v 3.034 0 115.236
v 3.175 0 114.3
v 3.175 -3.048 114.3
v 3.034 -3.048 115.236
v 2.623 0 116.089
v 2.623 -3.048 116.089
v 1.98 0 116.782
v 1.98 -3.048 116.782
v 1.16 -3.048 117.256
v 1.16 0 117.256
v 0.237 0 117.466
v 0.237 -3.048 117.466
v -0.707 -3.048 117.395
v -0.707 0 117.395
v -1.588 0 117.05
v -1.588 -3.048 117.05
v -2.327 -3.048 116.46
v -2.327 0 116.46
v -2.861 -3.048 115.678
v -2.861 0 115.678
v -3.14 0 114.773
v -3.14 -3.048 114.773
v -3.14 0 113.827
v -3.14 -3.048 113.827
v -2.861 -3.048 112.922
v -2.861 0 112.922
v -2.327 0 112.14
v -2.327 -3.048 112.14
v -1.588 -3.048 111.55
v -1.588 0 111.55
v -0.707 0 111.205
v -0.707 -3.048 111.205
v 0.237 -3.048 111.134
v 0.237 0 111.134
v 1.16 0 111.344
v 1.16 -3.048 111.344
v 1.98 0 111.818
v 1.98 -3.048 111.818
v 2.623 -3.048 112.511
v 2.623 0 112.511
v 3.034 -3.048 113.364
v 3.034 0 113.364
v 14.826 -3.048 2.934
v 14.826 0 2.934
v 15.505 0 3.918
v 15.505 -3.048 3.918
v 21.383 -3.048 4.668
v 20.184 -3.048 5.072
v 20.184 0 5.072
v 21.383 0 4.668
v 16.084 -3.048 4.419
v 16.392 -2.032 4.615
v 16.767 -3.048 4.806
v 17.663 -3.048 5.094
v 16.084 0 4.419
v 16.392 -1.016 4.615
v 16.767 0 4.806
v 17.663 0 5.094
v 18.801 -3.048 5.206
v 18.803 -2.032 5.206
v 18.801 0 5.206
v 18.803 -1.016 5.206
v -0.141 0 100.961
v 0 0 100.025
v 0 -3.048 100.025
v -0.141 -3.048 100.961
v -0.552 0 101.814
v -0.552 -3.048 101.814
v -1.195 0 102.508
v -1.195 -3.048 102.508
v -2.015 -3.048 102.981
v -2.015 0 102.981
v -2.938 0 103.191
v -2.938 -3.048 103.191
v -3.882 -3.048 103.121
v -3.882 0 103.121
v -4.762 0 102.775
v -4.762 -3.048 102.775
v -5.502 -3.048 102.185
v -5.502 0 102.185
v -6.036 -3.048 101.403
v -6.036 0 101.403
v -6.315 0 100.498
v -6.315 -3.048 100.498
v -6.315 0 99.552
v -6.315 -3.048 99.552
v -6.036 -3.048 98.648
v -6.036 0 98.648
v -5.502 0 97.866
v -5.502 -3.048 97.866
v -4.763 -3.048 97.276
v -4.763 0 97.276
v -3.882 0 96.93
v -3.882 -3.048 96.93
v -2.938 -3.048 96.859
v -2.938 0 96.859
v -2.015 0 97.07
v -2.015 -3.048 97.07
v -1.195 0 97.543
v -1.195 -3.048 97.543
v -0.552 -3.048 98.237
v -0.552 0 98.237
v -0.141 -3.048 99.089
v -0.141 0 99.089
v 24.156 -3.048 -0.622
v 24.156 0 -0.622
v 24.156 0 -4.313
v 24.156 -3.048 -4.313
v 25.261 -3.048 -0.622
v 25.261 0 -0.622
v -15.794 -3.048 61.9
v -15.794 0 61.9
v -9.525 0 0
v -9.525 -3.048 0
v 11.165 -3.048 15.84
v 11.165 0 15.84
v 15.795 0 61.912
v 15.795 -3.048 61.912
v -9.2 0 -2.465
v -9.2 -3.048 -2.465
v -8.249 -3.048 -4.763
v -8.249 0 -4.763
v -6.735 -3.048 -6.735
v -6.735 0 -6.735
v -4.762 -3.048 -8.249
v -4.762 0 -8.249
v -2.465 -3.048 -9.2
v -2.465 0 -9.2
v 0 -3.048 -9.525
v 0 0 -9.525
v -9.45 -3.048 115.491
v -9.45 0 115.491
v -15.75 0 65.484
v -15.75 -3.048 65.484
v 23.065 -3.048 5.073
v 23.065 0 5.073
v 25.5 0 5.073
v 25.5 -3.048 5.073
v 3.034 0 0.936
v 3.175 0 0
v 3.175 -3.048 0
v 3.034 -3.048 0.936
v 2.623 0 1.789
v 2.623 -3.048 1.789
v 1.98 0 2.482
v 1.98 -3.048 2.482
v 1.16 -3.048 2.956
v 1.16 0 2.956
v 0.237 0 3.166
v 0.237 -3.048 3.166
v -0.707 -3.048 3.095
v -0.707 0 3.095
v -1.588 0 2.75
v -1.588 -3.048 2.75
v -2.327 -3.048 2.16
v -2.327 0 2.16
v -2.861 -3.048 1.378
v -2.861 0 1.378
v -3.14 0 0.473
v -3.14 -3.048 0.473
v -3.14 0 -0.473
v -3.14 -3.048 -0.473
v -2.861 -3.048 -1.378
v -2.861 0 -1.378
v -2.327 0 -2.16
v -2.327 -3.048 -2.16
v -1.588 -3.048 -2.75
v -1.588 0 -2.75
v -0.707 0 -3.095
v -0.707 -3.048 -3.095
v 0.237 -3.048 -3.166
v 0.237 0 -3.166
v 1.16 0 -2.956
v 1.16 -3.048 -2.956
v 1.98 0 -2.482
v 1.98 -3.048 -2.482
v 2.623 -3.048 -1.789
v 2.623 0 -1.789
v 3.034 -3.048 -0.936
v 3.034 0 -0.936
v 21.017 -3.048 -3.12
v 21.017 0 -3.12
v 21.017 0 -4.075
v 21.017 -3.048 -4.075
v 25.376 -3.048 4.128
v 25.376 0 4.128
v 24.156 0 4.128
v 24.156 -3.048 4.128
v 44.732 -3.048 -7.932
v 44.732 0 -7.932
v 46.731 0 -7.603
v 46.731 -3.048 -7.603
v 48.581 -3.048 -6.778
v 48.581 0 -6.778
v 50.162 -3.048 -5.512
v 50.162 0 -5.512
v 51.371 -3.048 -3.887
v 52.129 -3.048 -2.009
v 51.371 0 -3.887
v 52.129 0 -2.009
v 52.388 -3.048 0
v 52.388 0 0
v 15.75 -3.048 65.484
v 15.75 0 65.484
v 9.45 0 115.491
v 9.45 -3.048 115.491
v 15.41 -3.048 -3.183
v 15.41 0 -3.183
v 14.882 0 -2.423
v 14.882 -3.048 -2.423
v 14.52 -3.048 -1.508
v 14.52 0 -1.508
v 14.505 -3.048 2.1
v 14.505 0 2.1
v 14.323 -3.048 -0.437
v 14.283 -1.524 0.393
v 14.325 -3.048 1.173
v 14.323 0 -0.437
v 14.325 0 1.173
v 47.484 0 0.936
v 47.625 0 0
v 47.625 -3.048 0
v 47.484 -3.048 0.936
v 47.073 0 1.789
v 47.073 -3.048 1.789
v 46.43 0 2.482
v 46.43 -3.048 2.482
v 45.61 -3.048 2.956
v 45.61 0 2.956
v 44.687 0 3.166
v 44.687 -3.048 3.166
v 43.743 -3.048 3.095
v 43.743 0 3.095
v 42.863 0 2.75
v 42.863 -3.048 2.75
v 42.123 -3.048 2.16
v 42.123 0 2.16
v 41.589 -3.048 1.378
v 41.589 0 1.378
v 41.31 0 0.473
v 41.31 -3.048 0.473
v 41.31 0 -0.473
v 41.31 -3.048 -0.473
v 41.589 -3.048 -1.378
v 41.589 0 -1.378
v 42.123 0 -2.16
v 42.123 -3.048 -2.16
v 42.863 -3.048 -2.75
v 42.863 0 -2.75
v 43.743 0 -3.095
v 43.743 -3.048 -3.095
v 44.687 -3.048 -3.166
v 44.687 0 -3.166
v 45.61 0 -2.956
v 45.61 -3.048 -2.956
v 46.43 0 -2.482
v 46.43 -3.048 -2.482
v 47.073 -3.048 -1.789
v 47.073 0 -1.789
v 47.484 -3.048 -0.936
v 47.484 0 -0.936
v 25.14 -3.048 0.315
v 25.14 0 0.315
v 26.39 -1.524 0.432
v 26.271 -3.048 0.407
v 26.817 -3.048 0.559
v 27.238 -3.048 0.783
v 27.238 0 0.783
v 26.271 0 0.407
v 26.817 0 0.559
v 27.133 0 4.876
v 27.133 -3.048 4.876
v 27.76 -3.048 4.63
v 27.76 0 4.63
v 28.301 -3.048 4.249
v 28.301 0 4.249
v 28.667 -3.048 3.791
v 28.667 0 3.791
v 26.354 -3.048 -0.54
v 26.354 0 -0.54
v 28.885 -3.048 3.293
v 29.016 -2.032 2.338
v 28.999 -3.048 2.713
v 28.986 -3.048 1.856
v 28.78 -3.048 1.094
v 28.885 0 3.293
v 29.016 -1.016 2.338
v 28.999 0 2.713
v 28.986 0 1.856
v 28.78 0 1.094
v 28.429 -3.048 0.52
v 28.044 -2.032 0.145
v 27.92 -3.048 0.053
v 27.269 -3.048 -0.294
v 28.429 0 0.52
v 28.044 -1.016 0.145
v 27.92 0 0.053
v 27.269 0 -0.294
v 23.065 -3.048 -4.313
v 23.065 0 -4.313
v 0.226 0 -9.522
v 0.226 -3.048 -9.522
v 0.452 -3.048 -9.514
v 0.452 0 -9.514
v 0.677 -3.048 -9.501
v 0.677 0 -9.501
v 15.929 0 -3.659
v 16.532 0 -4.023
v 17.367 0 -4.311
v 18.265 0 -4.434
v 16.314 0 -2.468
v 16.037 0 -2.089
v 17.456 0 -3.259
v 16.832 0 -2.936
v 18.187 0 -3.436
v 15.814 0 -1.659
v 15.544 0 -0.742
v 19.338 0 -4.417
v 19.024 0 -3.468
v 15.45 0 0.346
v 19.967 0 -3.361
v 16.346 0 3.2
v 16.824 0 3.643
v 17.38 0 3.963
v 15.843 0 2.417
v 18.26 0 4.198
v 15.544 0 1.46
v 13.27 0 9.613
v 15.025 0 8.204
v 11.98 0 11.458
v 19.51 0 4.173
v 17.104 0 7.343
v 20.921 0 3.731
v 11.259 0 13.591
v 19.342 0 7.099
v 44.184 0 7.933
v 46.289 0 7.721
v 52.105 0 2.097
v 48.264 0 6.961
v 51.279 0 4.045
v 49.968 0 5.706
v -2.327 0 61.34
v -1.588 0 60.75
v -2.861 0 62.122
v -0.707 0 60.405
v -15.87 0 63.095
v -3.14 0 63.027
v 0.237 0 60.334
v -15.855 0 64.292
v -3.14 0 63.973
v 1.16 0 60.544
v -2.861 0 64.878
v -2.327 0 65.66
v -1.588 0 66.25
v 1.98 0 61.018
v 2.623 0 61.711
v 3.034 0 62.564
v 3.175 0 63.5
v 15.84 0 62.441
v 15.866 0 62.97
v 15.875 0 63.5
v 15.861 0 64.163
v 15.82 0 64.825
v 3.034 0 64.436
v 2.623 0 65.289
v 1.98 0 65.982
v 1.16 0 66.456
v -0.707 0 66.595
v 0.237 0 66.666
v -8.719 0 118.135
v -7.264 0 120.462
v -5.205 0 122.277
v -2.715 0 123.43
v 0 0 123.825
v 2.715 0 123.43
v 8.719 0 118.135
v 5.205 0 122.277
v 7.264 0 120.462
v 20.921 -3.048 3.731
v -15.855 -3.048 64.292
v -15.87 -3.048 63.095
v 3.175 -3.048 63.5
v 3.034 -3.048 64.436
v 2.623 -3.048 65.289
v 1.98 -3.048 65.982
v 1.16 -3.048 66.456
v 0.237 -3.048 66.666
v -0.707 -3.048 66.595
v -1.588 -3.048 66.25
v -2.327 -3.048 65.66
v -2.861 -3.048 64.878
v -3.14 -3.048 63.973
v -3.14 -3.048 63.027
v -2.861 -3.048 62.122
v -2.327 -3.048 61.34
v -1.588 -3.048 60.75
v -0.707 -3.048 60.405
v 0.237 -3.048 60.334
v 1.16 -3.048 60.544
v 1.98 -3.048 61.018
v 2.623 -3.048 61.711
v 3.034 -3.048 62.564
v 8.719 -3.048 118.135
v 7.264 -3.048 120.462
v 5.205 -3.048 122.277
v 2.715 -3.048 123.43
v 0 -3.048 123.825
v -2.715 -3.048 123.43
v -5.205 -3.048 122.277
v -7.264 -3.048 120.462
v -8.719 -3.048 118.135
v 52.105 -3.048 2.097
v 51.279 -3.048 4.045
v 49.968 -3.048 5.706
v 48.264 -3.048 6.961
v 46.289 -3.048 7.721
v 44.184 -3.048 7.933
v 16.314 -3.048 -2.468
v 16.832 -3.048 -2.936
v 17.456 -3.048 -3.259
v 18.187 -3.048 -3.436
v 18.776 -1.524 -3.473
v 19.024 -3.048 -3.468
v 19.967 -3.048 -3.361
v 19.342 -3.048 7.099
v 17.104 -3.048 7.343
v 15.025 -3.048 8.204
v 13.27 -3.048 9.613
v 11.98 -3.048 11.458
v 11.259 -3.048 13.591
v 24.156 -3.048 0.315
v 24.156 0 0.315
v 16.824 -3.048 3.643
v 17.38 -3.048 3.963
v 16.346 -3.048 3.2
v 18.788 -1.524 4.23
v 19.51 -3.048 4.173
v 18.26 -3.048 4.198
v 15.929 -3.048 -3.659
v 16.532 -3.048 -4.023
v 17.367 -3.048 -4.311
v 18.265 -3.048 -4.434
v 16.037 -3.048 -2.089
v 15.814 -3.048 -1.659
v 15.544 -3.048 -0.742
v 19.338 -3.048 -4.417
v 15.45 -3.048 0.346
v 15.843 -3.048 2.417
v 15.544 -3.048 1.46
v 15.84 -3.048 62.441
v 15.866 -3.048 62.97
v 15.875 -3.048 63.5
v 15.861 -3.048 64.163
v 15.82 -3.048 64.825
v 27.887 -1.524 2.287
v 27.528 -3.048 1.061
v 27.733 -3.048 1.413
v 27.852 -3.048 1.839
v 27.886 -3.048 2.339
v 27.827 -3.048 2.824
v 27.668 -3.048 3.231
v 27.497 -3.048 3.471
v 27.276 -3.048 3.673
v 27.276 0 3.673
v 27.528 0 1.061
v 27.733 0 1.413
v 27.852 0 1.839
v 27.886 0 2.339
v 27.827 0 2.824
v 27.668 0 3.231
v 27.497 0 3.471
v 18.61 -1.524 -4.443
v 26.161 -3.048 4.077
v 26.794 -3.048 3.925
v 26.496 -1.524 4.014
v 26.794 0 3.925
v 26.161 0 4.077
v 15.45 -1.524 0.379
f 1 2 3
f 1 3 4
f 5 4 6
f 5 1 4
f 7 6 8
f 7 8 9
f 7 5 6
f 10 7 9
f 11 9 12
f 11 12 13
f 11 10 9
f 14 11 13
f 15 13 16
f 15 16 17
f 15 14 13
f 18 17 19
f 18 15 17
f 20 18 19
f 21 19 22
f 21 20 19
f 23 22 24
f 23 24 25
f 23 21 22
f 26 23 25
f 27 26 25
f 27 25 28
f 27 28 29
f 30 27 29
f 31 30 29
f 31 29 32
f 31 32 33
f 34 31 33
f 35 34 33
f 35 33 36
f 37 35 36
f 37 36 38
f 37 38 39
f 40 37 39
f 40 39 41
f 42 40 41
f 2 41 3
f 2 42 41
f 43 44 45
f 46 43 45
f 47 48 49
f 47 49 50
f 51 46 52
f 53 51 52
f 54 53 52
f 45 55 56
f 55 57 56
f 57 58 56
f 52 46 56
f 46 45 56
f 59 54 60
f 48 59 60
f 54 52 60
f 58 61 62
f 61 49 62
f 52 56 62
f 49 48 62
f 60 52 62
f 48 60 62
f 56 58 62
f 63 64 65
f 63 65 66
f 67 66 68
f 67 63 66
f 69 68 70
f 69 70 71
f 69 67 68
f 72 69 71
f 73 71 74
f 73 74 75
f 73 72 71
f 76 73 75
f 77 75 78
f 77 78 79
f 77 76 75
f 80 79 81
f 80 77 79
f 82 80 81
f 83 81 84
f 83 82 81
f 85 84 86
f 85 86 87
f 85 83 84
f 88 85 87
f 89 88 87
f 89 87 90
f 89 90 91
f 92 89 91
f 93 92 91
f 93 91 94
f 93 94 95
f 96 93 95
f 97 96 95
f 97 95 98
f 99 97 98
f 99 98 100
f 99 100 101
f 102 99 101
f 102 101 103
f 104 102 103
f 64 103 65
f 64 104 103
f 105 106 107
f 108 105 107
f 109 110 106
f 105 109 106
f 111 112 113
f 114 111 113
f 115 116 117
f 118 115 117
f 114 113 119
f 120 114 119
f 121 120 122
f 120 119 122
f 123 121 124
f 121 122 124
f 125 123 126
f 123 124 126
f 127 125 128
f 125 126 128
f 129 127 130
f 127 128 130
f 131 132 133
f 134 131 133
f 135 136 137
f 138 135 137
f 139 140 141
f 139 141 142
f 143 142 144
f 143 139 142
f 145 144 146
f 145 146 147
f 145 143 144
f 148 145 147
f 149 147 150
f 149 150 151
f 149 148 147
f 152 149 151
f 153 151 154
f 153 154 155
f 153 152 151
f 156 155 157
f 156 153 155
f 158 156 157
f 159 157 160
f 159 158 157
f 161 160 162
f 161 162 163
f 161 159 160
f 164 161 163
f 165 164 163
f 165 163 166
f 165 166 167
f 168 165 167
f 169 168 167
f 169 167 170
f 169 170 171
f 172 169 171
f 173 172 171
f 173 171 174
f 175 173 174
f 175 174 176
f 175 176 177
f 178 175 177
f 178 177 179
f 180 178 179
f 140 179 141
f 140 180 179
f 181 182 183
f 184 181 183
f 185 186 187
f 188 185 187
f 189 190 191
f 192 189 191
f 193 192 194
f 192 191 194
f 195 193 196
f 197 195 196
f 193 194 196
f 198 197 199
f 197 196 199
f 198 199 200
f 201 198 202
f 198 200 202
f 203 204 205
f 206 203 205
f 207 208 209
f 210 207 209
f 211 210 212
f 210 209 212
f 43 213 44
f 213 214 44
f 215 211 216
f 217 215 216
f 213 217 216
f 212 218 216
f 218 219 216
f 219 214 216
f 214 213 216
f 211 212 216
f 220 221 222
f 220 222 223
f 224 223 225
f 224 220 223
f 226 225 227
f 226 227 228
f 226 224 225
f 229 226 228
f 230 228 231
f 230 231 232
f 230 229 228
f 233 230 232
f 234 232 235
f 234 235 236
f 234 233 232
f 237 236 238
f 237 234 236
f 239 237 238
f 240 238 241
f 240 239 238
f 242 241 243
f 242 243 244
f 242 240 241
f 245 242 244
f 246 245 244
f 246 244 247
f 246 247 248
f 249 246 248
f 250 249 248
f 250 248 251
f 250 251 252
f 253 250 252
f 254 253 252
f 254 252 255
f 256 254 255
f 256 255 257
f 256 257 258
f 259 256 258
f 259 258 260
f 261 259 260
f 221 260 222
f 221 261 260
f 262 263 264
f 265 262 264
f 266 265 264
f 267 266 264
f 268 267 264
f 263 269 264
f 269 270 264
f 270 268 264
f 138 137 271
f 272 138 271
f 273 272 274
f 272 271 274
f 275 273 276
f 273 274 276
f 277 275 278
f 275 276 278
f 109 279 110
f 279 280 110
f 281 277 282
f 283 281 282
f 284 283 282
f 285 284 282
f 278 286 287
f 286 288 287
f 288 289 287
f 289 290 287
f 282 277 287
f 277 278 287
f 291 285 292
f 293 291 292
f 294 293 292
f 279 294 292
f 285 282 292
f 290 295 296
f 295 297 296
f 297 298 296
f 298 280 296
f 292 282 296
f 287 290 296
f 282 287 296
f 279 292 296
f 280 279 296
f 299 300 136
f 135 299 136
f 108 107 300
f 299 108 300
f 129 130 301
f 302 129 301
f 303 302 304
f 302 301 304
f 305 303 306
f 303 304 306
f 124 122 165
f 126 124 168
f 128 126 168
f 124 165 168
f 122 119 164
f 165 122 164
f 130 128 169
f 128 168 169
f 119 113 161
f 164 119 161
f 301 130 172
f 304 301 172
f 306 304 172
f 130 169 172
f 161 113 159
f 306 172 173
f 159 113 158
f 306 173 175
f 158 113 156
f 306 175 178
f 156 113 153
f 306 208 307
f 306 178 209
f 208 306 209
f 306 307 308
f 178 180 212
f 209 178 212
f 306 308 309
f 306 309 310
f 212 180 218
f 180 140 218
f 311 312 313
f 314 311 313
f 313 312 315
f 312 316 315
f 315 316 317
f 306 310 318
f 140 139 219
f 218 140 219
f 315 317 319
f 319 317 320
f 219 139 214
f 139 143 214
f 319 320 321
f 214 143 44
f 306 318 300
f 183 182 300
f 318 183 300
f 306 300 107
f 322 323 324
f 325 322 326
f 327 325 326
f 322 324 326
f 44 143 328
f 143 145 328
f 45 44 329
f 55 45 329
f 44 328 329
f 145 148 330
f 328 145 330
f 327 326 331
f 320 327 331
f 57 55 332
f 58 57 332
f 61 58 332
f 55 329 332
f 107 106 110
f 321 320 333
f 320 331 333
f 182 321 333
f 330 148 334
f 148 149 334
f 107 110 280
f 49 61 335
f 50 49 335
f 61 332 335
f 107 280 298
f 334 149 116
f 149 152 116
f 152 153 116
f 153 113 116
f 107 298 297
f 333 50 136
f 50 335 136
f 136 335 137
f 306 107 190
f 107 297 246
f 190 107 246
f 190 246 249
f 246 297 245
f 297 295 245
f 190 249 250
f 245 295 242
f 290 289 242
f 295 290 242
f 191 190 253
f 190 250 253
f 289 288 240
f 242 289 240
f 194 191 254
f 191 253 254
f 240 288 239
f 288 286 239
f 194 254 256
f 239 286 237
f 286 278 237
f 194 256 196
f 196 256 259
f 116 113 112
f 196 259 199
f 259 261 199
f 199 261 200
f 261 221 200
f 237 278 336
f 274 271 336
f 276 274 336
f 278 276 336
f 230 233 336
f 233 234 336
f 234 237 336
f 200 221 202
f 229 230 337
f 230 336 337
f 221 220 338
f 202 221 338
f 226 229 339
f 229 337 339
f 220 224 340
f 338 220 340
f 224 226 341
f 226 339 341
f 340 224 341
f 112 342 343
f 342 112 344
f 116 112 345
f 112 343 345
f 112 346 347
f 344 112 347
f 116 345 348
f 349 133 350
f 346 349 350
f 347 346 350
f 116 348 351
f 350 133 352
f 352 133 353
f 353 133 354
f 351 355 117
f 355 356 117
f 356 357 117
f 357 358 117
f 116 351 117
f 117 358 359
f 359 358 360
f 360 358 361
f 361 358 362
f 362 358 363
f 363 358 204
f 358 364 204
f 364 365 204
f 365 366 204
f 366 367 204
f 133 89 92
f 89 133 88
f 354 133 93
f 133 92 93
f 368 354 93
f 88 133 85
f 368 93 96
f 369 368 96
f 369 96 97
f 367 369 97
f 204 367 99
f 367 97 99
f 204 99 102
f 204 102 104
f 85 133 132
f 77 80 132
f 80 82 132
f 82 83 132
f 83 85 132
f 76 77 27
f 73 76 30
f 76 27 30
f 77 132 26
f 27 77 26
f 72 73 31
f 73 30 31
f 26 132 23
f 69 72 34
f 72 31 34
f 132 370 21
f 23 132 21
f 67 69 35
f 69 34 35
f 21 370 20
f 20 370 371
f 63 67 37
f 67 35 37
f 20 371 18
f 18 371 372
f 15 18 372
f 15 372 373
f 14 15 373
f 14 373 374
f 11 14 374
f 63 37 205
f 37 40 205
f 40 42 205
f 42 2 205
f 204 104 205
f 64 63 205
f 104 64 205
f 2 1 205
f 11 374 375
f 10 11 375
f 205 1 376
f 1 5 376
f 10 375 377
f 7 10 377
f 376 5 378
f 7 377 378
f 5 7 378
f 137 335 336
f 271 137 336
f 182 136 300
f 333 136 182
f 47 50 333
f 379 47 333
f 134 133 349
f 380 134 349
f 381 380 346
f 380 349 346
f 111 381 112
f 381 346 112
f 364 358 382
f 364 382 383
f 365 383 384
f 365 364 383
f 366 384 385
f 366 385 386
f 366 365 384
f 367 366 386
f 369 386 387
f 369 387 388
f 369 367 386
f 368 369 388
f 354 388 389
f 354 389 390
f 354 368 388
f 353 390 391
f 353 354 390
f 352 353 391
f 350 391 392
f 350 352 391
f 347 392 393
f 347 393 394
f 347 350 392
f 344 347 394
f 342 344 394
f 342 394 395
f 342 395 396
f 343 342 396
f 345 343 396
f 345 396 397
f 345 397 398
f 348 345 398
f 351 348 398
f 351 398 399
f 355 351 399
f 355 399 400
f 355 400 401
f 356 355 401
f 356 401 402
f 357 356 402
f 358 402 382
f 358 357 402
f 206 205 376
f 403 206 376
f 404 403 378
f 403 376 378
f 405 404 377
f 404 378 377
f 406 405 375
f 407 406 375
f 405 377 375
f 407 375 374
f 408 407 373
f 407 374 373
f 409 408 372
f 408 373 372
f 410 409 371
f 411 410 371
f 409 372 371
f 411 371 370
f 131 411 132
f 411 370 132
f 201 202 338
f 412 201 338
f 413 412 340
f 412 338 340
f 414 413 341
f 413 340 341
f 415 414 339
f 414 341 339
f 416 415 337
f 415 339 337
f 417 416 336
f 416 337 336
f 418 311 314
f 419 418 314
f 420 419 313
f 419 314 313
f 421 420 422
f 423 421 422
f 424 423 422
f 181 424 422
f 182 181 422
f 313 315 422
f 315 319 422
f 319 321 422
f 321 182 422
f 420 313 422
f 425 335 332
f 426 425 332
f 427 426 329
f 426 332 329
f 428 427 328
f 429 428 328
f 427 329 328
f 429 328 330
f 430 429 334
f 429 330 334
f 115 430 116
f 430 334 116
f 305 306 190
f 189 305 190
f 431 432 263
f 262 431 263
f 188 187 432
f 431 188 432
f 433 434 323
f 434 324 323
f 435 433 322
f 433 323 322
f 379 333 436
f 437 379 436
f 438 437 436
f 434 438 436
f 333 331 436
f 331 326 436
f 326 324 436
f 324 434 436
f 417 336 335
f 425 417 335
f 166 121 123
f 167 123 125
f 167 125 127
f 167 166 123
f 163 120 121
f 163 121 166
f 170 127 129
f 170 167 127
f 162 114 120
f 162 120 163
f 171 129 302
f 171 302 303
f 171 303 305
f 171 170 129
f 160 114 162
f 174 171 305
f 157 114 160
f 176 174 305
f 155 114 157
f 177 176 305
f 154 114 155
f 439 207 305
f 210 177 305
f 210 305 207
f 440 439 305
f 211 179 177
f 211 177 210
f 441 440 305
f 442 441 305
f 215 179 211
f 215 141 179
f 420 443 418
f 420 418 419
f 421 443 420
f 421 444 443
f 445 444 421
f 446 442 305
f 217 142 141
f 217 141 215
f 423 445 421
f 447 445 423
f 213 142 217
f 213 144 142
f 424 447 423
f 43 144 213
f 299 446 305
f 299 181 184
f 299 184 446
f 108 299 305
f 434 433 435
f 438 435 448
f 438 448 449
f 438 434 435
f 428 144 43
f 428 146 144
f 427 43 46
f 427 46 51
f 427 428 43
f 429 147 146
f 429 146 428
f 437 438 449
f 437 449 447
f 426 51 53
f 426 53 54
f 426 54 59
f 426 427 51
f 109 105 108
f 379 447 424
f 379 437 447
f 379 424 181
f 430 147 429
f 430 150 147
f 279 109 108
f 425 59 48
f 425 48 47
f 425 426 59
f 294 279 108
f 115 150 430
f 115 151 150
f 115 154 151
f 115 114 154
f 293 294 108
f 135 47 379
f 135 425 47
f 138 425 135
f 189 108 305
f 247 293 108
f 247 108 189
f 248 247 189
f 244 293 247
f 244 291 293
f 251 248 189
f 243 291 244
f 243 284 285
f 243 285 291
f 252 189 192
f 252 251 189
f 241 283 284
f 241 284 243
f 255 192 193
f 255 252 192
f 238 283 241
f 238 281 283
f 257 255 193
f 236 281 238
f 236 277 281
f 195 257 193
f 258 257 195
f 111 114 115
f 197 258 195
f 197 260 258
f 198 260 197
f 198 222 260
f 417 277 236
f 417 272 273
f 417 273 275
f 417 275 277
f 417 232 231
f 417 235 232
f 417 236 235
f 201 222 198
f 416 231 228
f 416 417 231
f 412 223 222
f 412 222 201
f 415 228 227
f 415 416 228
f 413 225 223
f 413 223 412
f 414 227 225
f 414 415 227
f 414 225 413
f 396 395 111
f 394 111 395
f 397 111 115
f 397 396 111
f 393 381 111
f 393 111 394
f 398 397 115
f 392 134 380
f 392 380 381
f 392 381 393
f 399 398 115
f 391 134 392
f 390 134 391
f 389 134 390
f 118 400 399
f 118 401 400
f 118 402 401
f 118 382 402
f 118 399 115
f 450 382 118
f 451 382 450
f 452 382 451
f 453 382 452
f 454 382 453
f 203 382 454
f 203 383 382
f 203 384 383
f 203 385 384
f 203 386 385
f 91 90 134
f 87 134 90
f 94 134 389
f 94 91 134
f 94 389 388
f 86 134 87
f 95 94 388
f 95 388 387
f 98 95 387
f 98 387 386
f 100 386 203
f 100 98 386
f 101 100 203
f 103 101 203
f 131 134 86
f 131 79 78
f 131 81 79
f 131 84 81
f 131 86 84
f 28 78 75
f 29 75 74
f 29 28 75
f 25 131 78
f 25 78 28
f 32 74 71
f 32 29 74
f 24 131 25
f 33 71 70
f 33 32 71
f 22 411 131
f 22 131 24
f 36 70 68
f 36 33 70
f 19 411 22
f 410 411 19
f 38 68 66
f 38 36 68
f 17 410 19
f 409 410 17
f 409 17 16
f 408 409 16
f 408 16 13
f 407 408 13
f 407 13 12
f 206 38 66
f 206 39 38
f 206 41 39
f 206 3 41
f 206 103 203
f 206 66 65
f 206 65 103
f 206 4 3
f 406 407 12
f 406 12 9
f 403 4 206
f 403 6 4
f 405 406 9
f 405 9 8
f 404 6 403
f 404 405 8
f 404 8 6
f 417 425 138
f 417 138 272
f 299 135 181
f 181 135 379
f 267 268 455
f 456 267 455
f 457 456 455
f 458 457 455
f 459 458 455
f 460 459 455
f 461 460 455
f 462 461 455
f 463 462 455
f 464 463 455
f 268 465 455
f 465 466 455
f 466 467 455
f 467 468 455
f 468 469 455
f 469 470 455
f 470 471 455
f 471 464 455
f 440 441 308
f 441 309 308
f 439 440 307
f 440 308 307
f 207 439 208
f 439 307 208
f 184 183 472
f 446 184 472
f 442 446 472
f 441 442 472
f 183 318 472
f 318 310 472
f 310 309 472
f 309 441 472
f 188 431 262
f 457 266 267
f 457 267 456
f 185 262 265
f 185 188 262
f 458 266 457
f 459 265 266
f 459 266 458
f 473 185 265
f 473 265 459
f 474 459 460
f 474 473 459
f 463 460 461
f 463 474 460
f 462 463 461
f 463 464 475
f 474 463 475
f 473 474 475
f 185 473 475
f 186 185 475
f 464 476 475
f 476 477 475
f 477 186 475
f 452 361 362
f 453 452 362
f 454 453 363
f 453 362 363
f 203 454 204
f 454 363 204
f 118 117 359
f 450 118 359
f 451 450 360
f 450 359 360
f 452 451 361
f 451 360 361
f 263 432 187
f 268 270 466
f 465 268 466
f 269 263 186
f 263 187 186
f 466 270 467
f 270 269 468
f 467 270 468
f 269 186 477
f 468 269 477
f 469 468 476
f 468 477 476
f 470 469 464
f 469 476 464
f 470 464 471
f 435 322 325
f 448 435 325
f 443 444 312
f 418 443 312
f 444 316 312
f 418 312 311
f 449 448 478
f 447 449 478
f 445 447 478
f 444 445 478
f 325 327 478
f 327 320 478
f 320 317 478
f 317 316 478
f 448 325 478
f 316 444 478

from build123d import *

# Parameters (mm, degrees)
F0_R     = 3.175
F1_DEPTH = 3.048


with BuildPart() as f1:
    # F0 (on Front) → F1 (new body)
    with BuildSketch(Plane.XZ):
        with BuildLine():
            ThreePointArc((0.6773435479, -9.500885786), (6.9705567315, -6.4912990883), (9.525, 0))
            ThreePointArc((9.525, 0), (0, 9.525), (-9.525, 0))
            ThreePointArc((-9.525, 0), (-6.7351920908, -6.7351920908), (0, -9.525))
            Line((0, -9.525), (0.6773435479, -9.500885786))
        make_face()
        Circle(F0_R, mode=Mode.SUBTRACT)
        with BuildLine():
            ThreePointArc((-9.525, 0), (0, 9.525), (9.525, 0))
            ThreePointArc((9.525, 0), (6.9705567315, -6.4912990883), (0.6773435479, -9.500885786))
            Line((0.6773435479, -9.500885786), (44.7324052746, -7.9324746146))
            ThreePointArc((44.7324052746, -7.9324746146), (36.517244624, -0.2744055301), (44.1835944934, 7.9330280698))
            Line((44.1835944934, 7.9330280698), (19.3421003836, 7.0988055303))
            ThreePointArc((19.3421003836, 7.0988055303), (13.26958371, 9.6131635709), (11.1649195057, 15.839546445))
            Line((11.1649195057, 15.839546445), (15.7954255641, 61.9125))
            ThreePointArc((15.7954255641, 61.9125), (0.0060905531, 47.6250011683), (-15.7942028036, 61.9003804205))
            Line((-15.7942028036, 61.9003804205), (-9.525, 0))
        make_face()
        with BuildLine():
            add(Edge.make_bspline(
                [(20.9206411995, 3.7311409307), (19.8544890082, 4.2303220145), (18.7883368169, 4.2303220145)],
                knots=[0, 0, 0, 1, 1, 1], degree=2))
            add(Edge.make_bspline(
                [(18.7883368169, 4.2303220145), (17.2414917301, 4.2303220145), (16.3458417197, 3.2001190782)],
                knots=[0, 0, 0, 1, 1, 1], degree=2))
            add(Edge.make_bspline(
                [(16.3458417197, 3.2001190782), (15.4501917092, 2.1699161419), (15.4501917092, 0.378616121)],
                knots=[0, 0, 0, 1, 1, 1], degree=2))
            add(Edge.make_bspline(
                [(15.4501917092, 0.378616121), (15.4501917092, -1.4619857353), (16.3140009509, -2.4675377538)],
                knots=[0, 0, 0, 1, 1, 1], degree=2))
            add(Edge.make_bspline(
                [(16.3140009509, -2.4675377538), (17.1778101926, -3.4730897724), (18.7760113581, -3.4730897724)],
                knots=[0, 0, 0, 1, 1, 1], degree=2))
            add(Edge.make_bspline(
                [(18.7760113581, -3.4730897724), (19.7579395805, -3.4730897724), (21.0171906273, -3.1197599518)],
                knots=[0, 0, 0, 1, 1, 1], degree=2))
            Line((21.0171906273, -3.1197599518), (21.0171906273, -4.0749830134))
            add(Edge.make_bspline(
                [(21.0171906273, -4.0749830134), (20.0414251343, -4.442692536), (18.6096176635, -4.442692536)],
                knots=[0, 0, 0, 1, 1, 1], degree=2))
            add(Edge.make_bspline(
                [(18.6096176635, -4.442692536), (16.536886332, -4.442692536), (15.4101339679, -3.1834414893)],
                knots=[0, 0, 0, 1, 1, 1], degree=2))
            add(Edge.make_bspline(
                [(15.4101339679, -3.1834414893), (14.2833816039, -1.9241904425), (14.2833816039, 0.3929958231)],
                knots=[0, 0, 0, 1, 1, 1], degree=2))
            add(Edge.make_bspline(
                [(14.2833816039, 0.3929958231), (14.2833816039, 1.8432914821), (14.8257017937, 2.9340945912)],
                knots=[0, 0, 0, 1, 1, 1], degree=2))
            add(Edge.make_bspline(
                [(14.8257017937, 2.9340945912), (15.3680219835, 4.0248977002), (16.3920621904, 4.6154926039)],
                knots=[0, 0, 0, 1, 1, 1], degree=2))
            add(Edge.make_bspline(
                [(16.3920621904, 4.6154926039), (17.4161023973, 5.2060875076), (18.8027165189, 5.2060875076)],
                knots=[0, 0, 0, 1, 1, 1], degree=2))
            add(Edge.make_bspline(
                [(18.8027165189, 5.2060875076), (20.2776630957, 5.2060875076), (21.3828459068, 4.667875804)],
                knots=[0, 0, 0, 1, 1, 1], degree=2))
            Line((21.3828459068, 4.667875804), (20.9206411995, 3.7311409307))
        make_face(mode=Mode.SUBTRACT)
        with BuildLine():
            add(Edge.make_bspline(
                [(25.4995491657, 5.0725617032), (29.0164134269, 5.0725617032), (29.0164134269, 2.3383640797)],
                knots=[0, 0, 0, 1, 1, 1], degree=2))
            add(Edge.make_bspline(
                [(29.0164134269, 2.3383640797), (29.0164134269, 0.9127193383), (28.0437292986, 0.1454595243)],
                knots=[0, 0, 0, 1, 1, 1], degree=2))
            add(Edge.make_bspline(
                [(28.0437292986, 0.1454595243), (27.0710451703, -0.6218002897), (25.2612569611, -0.6218002897)],
                knots=[0, 0, 0, 1, 1, 1], degree=2))
            Line((25.2612569611, -0.6218002897), (24.1560741501, -0.6218002897))
            Line((24.1560741501, -0.6218002897), (24.1560741501, -4.313275218))
            Line((24.1560741501, -4.313275218), (23.065271041, -4.313275218))
            Line((23.065271041, -4.313275218), (23.065271041, 5.0725617032))
            Line((23.065271041, 5.0725617032), (25.4995491657, 5.0725617032))
        make_face(mode=Mode.SUBTRACT)
        with BuildLine():
            ThreePointArc((0, -9.525), (0.3388863295, -9.5189695375), (0.6773435479, -9.500885786))
            Line((0.6773435479, -9.500885786), (0, -9.525))
        make_face()
        with BuildLine():
            ThreePointArc((-15.7504882737, 65.484375), (-15.8738192656, 63.6936154008), (-15.7942028036, 61.9003804205))
            ThreePointArc((-15.7942028036, 61.9003804205), (0.0060905531, 47.6250011683), (15.7954255641, 61.9125))
            ThreePointArc((15.7954255641, 61.9125), (15.8550939106, 62.7052534459), (15.875, 63.5))
            ThreePointArc((15.875, 63.5), (15.8438414904, 64.4941387366), (15.7504882737, 65.484375))
            ThreePointArc((15.7504882737, 65.484375), (0, 79.375), (-15.7504882737, 65.484375))
        make_face()
        with Locations((0, 63.5)):
            Circle(F0_R, mode=Mode.SUBTRACT)
        with BuildLine():
            ThreePointArc((44.1835944934, 7.9330280698), (36.517244624, -0.2744055301), (44.7324052746, -7.9324746146))
            ThreePointArc((44.7324052746, -7.9324746146), (50.1616327839, -5.5119104847), (52.3875, 0))
            ThreePointArc((52.3875, 0), (49.9676676477, 5.7060713262), (44.1835944934, 7.9330280698))
        make_face()
        with Locations((44.45, 0)):
            Circle(F0_R, mode=Mode.SUBTRACT)
        with BuildLine():
            Line((-9.4502929642, 115.490625), (-15.7504882737, 65.484375))
            ThreePointArc((-15.7504882737, 65.484375), (0, 79.375), (15.7504882737, 65.484375))
            Line((15.7504882737, 65.484375), (9.4502929642, 115.490625))
            ThreePointArc((9.4502929642, 115.490625), (9.5063048942, 114.896483242), (9.525, 114.3))
            ThreePointArc((9.525, 114.3), (-0.596483242, 104.7936951058), (-9.4502929642, 115.490625))
        make_face()
        with Locations((-3.175, 100.0252)):
            Circle(F0_R, mode=Mode.SUBTRACT)
        with BuildLine():
            ThreePointArc((9.4502929642, 115.490625), (0, 123.825), (-9.4502929642, 115.490625))
            ThreePointArc((-9.4502929642, 115.490625), (-0.596483242, 104.7936951058), (9.525, 114.3))
            ThreePointArc((9.525, 114.3), (9.5063048942, 114.896483242), (9.4502929642, 115.490625))
        make_face()
        with Locations((0, 114.3)):
            Circle(F0_R, mode=Mode.SUBTRACT)
    extrude(amount=F1_DEPTH)


with BuildPart() as f1b:
    # F0 (on Front) → F1, piece 2 (new body)
    with BuildSketch(Plane.XZ):
        with BuildLine():
            Line((24.1560741501, 4.1276098574), (24.1560741501, 0.3149345836))
            Line((24.1560741501, 0.3149345836), (25.1400566157, 0.3149345836))
            add(Edge.make_bspline(
                [(25.1400566157, 0.3149345836), (26.5903522748, 0.3149345836), (27.2384659864, 0.7833020203)],
                knots=[0, 0, 0, 1, 1, 1], degree=2))
            add(Edge.make_bspline(
                [(27.2384659864, 0.7833020203), (27.8865796981, 1.2516694569), (27.8865796981, 2.2870080011)],
                knots=[0, 0, 0, 1, 1, 1], degree=2))
            add(Edge.make_bspline(
                [(27.8865796981, 2.2870080011), (27.8865796981, 3.2175801449), (27.2764694846, 3.6725950012)],
                knots=[0, 0, 0, 1, 1, 1], degree=2))
            add(Edge.make_bspline(
                [(27.2764694846, 3.6725950012), (26.6663592711, 4.1276098574), (25.3762945771, 4.1276098574)],
                knots=[0, 0, 0, 1, 1, 1], degree=2))
            Line((25.3762945771, 4.1276098574), (24.1560741501, 4.1276098574))
        make_face()
    extrude(amount=F1_DEPTH)


solid = Compound([f1.part, f1b.part])
